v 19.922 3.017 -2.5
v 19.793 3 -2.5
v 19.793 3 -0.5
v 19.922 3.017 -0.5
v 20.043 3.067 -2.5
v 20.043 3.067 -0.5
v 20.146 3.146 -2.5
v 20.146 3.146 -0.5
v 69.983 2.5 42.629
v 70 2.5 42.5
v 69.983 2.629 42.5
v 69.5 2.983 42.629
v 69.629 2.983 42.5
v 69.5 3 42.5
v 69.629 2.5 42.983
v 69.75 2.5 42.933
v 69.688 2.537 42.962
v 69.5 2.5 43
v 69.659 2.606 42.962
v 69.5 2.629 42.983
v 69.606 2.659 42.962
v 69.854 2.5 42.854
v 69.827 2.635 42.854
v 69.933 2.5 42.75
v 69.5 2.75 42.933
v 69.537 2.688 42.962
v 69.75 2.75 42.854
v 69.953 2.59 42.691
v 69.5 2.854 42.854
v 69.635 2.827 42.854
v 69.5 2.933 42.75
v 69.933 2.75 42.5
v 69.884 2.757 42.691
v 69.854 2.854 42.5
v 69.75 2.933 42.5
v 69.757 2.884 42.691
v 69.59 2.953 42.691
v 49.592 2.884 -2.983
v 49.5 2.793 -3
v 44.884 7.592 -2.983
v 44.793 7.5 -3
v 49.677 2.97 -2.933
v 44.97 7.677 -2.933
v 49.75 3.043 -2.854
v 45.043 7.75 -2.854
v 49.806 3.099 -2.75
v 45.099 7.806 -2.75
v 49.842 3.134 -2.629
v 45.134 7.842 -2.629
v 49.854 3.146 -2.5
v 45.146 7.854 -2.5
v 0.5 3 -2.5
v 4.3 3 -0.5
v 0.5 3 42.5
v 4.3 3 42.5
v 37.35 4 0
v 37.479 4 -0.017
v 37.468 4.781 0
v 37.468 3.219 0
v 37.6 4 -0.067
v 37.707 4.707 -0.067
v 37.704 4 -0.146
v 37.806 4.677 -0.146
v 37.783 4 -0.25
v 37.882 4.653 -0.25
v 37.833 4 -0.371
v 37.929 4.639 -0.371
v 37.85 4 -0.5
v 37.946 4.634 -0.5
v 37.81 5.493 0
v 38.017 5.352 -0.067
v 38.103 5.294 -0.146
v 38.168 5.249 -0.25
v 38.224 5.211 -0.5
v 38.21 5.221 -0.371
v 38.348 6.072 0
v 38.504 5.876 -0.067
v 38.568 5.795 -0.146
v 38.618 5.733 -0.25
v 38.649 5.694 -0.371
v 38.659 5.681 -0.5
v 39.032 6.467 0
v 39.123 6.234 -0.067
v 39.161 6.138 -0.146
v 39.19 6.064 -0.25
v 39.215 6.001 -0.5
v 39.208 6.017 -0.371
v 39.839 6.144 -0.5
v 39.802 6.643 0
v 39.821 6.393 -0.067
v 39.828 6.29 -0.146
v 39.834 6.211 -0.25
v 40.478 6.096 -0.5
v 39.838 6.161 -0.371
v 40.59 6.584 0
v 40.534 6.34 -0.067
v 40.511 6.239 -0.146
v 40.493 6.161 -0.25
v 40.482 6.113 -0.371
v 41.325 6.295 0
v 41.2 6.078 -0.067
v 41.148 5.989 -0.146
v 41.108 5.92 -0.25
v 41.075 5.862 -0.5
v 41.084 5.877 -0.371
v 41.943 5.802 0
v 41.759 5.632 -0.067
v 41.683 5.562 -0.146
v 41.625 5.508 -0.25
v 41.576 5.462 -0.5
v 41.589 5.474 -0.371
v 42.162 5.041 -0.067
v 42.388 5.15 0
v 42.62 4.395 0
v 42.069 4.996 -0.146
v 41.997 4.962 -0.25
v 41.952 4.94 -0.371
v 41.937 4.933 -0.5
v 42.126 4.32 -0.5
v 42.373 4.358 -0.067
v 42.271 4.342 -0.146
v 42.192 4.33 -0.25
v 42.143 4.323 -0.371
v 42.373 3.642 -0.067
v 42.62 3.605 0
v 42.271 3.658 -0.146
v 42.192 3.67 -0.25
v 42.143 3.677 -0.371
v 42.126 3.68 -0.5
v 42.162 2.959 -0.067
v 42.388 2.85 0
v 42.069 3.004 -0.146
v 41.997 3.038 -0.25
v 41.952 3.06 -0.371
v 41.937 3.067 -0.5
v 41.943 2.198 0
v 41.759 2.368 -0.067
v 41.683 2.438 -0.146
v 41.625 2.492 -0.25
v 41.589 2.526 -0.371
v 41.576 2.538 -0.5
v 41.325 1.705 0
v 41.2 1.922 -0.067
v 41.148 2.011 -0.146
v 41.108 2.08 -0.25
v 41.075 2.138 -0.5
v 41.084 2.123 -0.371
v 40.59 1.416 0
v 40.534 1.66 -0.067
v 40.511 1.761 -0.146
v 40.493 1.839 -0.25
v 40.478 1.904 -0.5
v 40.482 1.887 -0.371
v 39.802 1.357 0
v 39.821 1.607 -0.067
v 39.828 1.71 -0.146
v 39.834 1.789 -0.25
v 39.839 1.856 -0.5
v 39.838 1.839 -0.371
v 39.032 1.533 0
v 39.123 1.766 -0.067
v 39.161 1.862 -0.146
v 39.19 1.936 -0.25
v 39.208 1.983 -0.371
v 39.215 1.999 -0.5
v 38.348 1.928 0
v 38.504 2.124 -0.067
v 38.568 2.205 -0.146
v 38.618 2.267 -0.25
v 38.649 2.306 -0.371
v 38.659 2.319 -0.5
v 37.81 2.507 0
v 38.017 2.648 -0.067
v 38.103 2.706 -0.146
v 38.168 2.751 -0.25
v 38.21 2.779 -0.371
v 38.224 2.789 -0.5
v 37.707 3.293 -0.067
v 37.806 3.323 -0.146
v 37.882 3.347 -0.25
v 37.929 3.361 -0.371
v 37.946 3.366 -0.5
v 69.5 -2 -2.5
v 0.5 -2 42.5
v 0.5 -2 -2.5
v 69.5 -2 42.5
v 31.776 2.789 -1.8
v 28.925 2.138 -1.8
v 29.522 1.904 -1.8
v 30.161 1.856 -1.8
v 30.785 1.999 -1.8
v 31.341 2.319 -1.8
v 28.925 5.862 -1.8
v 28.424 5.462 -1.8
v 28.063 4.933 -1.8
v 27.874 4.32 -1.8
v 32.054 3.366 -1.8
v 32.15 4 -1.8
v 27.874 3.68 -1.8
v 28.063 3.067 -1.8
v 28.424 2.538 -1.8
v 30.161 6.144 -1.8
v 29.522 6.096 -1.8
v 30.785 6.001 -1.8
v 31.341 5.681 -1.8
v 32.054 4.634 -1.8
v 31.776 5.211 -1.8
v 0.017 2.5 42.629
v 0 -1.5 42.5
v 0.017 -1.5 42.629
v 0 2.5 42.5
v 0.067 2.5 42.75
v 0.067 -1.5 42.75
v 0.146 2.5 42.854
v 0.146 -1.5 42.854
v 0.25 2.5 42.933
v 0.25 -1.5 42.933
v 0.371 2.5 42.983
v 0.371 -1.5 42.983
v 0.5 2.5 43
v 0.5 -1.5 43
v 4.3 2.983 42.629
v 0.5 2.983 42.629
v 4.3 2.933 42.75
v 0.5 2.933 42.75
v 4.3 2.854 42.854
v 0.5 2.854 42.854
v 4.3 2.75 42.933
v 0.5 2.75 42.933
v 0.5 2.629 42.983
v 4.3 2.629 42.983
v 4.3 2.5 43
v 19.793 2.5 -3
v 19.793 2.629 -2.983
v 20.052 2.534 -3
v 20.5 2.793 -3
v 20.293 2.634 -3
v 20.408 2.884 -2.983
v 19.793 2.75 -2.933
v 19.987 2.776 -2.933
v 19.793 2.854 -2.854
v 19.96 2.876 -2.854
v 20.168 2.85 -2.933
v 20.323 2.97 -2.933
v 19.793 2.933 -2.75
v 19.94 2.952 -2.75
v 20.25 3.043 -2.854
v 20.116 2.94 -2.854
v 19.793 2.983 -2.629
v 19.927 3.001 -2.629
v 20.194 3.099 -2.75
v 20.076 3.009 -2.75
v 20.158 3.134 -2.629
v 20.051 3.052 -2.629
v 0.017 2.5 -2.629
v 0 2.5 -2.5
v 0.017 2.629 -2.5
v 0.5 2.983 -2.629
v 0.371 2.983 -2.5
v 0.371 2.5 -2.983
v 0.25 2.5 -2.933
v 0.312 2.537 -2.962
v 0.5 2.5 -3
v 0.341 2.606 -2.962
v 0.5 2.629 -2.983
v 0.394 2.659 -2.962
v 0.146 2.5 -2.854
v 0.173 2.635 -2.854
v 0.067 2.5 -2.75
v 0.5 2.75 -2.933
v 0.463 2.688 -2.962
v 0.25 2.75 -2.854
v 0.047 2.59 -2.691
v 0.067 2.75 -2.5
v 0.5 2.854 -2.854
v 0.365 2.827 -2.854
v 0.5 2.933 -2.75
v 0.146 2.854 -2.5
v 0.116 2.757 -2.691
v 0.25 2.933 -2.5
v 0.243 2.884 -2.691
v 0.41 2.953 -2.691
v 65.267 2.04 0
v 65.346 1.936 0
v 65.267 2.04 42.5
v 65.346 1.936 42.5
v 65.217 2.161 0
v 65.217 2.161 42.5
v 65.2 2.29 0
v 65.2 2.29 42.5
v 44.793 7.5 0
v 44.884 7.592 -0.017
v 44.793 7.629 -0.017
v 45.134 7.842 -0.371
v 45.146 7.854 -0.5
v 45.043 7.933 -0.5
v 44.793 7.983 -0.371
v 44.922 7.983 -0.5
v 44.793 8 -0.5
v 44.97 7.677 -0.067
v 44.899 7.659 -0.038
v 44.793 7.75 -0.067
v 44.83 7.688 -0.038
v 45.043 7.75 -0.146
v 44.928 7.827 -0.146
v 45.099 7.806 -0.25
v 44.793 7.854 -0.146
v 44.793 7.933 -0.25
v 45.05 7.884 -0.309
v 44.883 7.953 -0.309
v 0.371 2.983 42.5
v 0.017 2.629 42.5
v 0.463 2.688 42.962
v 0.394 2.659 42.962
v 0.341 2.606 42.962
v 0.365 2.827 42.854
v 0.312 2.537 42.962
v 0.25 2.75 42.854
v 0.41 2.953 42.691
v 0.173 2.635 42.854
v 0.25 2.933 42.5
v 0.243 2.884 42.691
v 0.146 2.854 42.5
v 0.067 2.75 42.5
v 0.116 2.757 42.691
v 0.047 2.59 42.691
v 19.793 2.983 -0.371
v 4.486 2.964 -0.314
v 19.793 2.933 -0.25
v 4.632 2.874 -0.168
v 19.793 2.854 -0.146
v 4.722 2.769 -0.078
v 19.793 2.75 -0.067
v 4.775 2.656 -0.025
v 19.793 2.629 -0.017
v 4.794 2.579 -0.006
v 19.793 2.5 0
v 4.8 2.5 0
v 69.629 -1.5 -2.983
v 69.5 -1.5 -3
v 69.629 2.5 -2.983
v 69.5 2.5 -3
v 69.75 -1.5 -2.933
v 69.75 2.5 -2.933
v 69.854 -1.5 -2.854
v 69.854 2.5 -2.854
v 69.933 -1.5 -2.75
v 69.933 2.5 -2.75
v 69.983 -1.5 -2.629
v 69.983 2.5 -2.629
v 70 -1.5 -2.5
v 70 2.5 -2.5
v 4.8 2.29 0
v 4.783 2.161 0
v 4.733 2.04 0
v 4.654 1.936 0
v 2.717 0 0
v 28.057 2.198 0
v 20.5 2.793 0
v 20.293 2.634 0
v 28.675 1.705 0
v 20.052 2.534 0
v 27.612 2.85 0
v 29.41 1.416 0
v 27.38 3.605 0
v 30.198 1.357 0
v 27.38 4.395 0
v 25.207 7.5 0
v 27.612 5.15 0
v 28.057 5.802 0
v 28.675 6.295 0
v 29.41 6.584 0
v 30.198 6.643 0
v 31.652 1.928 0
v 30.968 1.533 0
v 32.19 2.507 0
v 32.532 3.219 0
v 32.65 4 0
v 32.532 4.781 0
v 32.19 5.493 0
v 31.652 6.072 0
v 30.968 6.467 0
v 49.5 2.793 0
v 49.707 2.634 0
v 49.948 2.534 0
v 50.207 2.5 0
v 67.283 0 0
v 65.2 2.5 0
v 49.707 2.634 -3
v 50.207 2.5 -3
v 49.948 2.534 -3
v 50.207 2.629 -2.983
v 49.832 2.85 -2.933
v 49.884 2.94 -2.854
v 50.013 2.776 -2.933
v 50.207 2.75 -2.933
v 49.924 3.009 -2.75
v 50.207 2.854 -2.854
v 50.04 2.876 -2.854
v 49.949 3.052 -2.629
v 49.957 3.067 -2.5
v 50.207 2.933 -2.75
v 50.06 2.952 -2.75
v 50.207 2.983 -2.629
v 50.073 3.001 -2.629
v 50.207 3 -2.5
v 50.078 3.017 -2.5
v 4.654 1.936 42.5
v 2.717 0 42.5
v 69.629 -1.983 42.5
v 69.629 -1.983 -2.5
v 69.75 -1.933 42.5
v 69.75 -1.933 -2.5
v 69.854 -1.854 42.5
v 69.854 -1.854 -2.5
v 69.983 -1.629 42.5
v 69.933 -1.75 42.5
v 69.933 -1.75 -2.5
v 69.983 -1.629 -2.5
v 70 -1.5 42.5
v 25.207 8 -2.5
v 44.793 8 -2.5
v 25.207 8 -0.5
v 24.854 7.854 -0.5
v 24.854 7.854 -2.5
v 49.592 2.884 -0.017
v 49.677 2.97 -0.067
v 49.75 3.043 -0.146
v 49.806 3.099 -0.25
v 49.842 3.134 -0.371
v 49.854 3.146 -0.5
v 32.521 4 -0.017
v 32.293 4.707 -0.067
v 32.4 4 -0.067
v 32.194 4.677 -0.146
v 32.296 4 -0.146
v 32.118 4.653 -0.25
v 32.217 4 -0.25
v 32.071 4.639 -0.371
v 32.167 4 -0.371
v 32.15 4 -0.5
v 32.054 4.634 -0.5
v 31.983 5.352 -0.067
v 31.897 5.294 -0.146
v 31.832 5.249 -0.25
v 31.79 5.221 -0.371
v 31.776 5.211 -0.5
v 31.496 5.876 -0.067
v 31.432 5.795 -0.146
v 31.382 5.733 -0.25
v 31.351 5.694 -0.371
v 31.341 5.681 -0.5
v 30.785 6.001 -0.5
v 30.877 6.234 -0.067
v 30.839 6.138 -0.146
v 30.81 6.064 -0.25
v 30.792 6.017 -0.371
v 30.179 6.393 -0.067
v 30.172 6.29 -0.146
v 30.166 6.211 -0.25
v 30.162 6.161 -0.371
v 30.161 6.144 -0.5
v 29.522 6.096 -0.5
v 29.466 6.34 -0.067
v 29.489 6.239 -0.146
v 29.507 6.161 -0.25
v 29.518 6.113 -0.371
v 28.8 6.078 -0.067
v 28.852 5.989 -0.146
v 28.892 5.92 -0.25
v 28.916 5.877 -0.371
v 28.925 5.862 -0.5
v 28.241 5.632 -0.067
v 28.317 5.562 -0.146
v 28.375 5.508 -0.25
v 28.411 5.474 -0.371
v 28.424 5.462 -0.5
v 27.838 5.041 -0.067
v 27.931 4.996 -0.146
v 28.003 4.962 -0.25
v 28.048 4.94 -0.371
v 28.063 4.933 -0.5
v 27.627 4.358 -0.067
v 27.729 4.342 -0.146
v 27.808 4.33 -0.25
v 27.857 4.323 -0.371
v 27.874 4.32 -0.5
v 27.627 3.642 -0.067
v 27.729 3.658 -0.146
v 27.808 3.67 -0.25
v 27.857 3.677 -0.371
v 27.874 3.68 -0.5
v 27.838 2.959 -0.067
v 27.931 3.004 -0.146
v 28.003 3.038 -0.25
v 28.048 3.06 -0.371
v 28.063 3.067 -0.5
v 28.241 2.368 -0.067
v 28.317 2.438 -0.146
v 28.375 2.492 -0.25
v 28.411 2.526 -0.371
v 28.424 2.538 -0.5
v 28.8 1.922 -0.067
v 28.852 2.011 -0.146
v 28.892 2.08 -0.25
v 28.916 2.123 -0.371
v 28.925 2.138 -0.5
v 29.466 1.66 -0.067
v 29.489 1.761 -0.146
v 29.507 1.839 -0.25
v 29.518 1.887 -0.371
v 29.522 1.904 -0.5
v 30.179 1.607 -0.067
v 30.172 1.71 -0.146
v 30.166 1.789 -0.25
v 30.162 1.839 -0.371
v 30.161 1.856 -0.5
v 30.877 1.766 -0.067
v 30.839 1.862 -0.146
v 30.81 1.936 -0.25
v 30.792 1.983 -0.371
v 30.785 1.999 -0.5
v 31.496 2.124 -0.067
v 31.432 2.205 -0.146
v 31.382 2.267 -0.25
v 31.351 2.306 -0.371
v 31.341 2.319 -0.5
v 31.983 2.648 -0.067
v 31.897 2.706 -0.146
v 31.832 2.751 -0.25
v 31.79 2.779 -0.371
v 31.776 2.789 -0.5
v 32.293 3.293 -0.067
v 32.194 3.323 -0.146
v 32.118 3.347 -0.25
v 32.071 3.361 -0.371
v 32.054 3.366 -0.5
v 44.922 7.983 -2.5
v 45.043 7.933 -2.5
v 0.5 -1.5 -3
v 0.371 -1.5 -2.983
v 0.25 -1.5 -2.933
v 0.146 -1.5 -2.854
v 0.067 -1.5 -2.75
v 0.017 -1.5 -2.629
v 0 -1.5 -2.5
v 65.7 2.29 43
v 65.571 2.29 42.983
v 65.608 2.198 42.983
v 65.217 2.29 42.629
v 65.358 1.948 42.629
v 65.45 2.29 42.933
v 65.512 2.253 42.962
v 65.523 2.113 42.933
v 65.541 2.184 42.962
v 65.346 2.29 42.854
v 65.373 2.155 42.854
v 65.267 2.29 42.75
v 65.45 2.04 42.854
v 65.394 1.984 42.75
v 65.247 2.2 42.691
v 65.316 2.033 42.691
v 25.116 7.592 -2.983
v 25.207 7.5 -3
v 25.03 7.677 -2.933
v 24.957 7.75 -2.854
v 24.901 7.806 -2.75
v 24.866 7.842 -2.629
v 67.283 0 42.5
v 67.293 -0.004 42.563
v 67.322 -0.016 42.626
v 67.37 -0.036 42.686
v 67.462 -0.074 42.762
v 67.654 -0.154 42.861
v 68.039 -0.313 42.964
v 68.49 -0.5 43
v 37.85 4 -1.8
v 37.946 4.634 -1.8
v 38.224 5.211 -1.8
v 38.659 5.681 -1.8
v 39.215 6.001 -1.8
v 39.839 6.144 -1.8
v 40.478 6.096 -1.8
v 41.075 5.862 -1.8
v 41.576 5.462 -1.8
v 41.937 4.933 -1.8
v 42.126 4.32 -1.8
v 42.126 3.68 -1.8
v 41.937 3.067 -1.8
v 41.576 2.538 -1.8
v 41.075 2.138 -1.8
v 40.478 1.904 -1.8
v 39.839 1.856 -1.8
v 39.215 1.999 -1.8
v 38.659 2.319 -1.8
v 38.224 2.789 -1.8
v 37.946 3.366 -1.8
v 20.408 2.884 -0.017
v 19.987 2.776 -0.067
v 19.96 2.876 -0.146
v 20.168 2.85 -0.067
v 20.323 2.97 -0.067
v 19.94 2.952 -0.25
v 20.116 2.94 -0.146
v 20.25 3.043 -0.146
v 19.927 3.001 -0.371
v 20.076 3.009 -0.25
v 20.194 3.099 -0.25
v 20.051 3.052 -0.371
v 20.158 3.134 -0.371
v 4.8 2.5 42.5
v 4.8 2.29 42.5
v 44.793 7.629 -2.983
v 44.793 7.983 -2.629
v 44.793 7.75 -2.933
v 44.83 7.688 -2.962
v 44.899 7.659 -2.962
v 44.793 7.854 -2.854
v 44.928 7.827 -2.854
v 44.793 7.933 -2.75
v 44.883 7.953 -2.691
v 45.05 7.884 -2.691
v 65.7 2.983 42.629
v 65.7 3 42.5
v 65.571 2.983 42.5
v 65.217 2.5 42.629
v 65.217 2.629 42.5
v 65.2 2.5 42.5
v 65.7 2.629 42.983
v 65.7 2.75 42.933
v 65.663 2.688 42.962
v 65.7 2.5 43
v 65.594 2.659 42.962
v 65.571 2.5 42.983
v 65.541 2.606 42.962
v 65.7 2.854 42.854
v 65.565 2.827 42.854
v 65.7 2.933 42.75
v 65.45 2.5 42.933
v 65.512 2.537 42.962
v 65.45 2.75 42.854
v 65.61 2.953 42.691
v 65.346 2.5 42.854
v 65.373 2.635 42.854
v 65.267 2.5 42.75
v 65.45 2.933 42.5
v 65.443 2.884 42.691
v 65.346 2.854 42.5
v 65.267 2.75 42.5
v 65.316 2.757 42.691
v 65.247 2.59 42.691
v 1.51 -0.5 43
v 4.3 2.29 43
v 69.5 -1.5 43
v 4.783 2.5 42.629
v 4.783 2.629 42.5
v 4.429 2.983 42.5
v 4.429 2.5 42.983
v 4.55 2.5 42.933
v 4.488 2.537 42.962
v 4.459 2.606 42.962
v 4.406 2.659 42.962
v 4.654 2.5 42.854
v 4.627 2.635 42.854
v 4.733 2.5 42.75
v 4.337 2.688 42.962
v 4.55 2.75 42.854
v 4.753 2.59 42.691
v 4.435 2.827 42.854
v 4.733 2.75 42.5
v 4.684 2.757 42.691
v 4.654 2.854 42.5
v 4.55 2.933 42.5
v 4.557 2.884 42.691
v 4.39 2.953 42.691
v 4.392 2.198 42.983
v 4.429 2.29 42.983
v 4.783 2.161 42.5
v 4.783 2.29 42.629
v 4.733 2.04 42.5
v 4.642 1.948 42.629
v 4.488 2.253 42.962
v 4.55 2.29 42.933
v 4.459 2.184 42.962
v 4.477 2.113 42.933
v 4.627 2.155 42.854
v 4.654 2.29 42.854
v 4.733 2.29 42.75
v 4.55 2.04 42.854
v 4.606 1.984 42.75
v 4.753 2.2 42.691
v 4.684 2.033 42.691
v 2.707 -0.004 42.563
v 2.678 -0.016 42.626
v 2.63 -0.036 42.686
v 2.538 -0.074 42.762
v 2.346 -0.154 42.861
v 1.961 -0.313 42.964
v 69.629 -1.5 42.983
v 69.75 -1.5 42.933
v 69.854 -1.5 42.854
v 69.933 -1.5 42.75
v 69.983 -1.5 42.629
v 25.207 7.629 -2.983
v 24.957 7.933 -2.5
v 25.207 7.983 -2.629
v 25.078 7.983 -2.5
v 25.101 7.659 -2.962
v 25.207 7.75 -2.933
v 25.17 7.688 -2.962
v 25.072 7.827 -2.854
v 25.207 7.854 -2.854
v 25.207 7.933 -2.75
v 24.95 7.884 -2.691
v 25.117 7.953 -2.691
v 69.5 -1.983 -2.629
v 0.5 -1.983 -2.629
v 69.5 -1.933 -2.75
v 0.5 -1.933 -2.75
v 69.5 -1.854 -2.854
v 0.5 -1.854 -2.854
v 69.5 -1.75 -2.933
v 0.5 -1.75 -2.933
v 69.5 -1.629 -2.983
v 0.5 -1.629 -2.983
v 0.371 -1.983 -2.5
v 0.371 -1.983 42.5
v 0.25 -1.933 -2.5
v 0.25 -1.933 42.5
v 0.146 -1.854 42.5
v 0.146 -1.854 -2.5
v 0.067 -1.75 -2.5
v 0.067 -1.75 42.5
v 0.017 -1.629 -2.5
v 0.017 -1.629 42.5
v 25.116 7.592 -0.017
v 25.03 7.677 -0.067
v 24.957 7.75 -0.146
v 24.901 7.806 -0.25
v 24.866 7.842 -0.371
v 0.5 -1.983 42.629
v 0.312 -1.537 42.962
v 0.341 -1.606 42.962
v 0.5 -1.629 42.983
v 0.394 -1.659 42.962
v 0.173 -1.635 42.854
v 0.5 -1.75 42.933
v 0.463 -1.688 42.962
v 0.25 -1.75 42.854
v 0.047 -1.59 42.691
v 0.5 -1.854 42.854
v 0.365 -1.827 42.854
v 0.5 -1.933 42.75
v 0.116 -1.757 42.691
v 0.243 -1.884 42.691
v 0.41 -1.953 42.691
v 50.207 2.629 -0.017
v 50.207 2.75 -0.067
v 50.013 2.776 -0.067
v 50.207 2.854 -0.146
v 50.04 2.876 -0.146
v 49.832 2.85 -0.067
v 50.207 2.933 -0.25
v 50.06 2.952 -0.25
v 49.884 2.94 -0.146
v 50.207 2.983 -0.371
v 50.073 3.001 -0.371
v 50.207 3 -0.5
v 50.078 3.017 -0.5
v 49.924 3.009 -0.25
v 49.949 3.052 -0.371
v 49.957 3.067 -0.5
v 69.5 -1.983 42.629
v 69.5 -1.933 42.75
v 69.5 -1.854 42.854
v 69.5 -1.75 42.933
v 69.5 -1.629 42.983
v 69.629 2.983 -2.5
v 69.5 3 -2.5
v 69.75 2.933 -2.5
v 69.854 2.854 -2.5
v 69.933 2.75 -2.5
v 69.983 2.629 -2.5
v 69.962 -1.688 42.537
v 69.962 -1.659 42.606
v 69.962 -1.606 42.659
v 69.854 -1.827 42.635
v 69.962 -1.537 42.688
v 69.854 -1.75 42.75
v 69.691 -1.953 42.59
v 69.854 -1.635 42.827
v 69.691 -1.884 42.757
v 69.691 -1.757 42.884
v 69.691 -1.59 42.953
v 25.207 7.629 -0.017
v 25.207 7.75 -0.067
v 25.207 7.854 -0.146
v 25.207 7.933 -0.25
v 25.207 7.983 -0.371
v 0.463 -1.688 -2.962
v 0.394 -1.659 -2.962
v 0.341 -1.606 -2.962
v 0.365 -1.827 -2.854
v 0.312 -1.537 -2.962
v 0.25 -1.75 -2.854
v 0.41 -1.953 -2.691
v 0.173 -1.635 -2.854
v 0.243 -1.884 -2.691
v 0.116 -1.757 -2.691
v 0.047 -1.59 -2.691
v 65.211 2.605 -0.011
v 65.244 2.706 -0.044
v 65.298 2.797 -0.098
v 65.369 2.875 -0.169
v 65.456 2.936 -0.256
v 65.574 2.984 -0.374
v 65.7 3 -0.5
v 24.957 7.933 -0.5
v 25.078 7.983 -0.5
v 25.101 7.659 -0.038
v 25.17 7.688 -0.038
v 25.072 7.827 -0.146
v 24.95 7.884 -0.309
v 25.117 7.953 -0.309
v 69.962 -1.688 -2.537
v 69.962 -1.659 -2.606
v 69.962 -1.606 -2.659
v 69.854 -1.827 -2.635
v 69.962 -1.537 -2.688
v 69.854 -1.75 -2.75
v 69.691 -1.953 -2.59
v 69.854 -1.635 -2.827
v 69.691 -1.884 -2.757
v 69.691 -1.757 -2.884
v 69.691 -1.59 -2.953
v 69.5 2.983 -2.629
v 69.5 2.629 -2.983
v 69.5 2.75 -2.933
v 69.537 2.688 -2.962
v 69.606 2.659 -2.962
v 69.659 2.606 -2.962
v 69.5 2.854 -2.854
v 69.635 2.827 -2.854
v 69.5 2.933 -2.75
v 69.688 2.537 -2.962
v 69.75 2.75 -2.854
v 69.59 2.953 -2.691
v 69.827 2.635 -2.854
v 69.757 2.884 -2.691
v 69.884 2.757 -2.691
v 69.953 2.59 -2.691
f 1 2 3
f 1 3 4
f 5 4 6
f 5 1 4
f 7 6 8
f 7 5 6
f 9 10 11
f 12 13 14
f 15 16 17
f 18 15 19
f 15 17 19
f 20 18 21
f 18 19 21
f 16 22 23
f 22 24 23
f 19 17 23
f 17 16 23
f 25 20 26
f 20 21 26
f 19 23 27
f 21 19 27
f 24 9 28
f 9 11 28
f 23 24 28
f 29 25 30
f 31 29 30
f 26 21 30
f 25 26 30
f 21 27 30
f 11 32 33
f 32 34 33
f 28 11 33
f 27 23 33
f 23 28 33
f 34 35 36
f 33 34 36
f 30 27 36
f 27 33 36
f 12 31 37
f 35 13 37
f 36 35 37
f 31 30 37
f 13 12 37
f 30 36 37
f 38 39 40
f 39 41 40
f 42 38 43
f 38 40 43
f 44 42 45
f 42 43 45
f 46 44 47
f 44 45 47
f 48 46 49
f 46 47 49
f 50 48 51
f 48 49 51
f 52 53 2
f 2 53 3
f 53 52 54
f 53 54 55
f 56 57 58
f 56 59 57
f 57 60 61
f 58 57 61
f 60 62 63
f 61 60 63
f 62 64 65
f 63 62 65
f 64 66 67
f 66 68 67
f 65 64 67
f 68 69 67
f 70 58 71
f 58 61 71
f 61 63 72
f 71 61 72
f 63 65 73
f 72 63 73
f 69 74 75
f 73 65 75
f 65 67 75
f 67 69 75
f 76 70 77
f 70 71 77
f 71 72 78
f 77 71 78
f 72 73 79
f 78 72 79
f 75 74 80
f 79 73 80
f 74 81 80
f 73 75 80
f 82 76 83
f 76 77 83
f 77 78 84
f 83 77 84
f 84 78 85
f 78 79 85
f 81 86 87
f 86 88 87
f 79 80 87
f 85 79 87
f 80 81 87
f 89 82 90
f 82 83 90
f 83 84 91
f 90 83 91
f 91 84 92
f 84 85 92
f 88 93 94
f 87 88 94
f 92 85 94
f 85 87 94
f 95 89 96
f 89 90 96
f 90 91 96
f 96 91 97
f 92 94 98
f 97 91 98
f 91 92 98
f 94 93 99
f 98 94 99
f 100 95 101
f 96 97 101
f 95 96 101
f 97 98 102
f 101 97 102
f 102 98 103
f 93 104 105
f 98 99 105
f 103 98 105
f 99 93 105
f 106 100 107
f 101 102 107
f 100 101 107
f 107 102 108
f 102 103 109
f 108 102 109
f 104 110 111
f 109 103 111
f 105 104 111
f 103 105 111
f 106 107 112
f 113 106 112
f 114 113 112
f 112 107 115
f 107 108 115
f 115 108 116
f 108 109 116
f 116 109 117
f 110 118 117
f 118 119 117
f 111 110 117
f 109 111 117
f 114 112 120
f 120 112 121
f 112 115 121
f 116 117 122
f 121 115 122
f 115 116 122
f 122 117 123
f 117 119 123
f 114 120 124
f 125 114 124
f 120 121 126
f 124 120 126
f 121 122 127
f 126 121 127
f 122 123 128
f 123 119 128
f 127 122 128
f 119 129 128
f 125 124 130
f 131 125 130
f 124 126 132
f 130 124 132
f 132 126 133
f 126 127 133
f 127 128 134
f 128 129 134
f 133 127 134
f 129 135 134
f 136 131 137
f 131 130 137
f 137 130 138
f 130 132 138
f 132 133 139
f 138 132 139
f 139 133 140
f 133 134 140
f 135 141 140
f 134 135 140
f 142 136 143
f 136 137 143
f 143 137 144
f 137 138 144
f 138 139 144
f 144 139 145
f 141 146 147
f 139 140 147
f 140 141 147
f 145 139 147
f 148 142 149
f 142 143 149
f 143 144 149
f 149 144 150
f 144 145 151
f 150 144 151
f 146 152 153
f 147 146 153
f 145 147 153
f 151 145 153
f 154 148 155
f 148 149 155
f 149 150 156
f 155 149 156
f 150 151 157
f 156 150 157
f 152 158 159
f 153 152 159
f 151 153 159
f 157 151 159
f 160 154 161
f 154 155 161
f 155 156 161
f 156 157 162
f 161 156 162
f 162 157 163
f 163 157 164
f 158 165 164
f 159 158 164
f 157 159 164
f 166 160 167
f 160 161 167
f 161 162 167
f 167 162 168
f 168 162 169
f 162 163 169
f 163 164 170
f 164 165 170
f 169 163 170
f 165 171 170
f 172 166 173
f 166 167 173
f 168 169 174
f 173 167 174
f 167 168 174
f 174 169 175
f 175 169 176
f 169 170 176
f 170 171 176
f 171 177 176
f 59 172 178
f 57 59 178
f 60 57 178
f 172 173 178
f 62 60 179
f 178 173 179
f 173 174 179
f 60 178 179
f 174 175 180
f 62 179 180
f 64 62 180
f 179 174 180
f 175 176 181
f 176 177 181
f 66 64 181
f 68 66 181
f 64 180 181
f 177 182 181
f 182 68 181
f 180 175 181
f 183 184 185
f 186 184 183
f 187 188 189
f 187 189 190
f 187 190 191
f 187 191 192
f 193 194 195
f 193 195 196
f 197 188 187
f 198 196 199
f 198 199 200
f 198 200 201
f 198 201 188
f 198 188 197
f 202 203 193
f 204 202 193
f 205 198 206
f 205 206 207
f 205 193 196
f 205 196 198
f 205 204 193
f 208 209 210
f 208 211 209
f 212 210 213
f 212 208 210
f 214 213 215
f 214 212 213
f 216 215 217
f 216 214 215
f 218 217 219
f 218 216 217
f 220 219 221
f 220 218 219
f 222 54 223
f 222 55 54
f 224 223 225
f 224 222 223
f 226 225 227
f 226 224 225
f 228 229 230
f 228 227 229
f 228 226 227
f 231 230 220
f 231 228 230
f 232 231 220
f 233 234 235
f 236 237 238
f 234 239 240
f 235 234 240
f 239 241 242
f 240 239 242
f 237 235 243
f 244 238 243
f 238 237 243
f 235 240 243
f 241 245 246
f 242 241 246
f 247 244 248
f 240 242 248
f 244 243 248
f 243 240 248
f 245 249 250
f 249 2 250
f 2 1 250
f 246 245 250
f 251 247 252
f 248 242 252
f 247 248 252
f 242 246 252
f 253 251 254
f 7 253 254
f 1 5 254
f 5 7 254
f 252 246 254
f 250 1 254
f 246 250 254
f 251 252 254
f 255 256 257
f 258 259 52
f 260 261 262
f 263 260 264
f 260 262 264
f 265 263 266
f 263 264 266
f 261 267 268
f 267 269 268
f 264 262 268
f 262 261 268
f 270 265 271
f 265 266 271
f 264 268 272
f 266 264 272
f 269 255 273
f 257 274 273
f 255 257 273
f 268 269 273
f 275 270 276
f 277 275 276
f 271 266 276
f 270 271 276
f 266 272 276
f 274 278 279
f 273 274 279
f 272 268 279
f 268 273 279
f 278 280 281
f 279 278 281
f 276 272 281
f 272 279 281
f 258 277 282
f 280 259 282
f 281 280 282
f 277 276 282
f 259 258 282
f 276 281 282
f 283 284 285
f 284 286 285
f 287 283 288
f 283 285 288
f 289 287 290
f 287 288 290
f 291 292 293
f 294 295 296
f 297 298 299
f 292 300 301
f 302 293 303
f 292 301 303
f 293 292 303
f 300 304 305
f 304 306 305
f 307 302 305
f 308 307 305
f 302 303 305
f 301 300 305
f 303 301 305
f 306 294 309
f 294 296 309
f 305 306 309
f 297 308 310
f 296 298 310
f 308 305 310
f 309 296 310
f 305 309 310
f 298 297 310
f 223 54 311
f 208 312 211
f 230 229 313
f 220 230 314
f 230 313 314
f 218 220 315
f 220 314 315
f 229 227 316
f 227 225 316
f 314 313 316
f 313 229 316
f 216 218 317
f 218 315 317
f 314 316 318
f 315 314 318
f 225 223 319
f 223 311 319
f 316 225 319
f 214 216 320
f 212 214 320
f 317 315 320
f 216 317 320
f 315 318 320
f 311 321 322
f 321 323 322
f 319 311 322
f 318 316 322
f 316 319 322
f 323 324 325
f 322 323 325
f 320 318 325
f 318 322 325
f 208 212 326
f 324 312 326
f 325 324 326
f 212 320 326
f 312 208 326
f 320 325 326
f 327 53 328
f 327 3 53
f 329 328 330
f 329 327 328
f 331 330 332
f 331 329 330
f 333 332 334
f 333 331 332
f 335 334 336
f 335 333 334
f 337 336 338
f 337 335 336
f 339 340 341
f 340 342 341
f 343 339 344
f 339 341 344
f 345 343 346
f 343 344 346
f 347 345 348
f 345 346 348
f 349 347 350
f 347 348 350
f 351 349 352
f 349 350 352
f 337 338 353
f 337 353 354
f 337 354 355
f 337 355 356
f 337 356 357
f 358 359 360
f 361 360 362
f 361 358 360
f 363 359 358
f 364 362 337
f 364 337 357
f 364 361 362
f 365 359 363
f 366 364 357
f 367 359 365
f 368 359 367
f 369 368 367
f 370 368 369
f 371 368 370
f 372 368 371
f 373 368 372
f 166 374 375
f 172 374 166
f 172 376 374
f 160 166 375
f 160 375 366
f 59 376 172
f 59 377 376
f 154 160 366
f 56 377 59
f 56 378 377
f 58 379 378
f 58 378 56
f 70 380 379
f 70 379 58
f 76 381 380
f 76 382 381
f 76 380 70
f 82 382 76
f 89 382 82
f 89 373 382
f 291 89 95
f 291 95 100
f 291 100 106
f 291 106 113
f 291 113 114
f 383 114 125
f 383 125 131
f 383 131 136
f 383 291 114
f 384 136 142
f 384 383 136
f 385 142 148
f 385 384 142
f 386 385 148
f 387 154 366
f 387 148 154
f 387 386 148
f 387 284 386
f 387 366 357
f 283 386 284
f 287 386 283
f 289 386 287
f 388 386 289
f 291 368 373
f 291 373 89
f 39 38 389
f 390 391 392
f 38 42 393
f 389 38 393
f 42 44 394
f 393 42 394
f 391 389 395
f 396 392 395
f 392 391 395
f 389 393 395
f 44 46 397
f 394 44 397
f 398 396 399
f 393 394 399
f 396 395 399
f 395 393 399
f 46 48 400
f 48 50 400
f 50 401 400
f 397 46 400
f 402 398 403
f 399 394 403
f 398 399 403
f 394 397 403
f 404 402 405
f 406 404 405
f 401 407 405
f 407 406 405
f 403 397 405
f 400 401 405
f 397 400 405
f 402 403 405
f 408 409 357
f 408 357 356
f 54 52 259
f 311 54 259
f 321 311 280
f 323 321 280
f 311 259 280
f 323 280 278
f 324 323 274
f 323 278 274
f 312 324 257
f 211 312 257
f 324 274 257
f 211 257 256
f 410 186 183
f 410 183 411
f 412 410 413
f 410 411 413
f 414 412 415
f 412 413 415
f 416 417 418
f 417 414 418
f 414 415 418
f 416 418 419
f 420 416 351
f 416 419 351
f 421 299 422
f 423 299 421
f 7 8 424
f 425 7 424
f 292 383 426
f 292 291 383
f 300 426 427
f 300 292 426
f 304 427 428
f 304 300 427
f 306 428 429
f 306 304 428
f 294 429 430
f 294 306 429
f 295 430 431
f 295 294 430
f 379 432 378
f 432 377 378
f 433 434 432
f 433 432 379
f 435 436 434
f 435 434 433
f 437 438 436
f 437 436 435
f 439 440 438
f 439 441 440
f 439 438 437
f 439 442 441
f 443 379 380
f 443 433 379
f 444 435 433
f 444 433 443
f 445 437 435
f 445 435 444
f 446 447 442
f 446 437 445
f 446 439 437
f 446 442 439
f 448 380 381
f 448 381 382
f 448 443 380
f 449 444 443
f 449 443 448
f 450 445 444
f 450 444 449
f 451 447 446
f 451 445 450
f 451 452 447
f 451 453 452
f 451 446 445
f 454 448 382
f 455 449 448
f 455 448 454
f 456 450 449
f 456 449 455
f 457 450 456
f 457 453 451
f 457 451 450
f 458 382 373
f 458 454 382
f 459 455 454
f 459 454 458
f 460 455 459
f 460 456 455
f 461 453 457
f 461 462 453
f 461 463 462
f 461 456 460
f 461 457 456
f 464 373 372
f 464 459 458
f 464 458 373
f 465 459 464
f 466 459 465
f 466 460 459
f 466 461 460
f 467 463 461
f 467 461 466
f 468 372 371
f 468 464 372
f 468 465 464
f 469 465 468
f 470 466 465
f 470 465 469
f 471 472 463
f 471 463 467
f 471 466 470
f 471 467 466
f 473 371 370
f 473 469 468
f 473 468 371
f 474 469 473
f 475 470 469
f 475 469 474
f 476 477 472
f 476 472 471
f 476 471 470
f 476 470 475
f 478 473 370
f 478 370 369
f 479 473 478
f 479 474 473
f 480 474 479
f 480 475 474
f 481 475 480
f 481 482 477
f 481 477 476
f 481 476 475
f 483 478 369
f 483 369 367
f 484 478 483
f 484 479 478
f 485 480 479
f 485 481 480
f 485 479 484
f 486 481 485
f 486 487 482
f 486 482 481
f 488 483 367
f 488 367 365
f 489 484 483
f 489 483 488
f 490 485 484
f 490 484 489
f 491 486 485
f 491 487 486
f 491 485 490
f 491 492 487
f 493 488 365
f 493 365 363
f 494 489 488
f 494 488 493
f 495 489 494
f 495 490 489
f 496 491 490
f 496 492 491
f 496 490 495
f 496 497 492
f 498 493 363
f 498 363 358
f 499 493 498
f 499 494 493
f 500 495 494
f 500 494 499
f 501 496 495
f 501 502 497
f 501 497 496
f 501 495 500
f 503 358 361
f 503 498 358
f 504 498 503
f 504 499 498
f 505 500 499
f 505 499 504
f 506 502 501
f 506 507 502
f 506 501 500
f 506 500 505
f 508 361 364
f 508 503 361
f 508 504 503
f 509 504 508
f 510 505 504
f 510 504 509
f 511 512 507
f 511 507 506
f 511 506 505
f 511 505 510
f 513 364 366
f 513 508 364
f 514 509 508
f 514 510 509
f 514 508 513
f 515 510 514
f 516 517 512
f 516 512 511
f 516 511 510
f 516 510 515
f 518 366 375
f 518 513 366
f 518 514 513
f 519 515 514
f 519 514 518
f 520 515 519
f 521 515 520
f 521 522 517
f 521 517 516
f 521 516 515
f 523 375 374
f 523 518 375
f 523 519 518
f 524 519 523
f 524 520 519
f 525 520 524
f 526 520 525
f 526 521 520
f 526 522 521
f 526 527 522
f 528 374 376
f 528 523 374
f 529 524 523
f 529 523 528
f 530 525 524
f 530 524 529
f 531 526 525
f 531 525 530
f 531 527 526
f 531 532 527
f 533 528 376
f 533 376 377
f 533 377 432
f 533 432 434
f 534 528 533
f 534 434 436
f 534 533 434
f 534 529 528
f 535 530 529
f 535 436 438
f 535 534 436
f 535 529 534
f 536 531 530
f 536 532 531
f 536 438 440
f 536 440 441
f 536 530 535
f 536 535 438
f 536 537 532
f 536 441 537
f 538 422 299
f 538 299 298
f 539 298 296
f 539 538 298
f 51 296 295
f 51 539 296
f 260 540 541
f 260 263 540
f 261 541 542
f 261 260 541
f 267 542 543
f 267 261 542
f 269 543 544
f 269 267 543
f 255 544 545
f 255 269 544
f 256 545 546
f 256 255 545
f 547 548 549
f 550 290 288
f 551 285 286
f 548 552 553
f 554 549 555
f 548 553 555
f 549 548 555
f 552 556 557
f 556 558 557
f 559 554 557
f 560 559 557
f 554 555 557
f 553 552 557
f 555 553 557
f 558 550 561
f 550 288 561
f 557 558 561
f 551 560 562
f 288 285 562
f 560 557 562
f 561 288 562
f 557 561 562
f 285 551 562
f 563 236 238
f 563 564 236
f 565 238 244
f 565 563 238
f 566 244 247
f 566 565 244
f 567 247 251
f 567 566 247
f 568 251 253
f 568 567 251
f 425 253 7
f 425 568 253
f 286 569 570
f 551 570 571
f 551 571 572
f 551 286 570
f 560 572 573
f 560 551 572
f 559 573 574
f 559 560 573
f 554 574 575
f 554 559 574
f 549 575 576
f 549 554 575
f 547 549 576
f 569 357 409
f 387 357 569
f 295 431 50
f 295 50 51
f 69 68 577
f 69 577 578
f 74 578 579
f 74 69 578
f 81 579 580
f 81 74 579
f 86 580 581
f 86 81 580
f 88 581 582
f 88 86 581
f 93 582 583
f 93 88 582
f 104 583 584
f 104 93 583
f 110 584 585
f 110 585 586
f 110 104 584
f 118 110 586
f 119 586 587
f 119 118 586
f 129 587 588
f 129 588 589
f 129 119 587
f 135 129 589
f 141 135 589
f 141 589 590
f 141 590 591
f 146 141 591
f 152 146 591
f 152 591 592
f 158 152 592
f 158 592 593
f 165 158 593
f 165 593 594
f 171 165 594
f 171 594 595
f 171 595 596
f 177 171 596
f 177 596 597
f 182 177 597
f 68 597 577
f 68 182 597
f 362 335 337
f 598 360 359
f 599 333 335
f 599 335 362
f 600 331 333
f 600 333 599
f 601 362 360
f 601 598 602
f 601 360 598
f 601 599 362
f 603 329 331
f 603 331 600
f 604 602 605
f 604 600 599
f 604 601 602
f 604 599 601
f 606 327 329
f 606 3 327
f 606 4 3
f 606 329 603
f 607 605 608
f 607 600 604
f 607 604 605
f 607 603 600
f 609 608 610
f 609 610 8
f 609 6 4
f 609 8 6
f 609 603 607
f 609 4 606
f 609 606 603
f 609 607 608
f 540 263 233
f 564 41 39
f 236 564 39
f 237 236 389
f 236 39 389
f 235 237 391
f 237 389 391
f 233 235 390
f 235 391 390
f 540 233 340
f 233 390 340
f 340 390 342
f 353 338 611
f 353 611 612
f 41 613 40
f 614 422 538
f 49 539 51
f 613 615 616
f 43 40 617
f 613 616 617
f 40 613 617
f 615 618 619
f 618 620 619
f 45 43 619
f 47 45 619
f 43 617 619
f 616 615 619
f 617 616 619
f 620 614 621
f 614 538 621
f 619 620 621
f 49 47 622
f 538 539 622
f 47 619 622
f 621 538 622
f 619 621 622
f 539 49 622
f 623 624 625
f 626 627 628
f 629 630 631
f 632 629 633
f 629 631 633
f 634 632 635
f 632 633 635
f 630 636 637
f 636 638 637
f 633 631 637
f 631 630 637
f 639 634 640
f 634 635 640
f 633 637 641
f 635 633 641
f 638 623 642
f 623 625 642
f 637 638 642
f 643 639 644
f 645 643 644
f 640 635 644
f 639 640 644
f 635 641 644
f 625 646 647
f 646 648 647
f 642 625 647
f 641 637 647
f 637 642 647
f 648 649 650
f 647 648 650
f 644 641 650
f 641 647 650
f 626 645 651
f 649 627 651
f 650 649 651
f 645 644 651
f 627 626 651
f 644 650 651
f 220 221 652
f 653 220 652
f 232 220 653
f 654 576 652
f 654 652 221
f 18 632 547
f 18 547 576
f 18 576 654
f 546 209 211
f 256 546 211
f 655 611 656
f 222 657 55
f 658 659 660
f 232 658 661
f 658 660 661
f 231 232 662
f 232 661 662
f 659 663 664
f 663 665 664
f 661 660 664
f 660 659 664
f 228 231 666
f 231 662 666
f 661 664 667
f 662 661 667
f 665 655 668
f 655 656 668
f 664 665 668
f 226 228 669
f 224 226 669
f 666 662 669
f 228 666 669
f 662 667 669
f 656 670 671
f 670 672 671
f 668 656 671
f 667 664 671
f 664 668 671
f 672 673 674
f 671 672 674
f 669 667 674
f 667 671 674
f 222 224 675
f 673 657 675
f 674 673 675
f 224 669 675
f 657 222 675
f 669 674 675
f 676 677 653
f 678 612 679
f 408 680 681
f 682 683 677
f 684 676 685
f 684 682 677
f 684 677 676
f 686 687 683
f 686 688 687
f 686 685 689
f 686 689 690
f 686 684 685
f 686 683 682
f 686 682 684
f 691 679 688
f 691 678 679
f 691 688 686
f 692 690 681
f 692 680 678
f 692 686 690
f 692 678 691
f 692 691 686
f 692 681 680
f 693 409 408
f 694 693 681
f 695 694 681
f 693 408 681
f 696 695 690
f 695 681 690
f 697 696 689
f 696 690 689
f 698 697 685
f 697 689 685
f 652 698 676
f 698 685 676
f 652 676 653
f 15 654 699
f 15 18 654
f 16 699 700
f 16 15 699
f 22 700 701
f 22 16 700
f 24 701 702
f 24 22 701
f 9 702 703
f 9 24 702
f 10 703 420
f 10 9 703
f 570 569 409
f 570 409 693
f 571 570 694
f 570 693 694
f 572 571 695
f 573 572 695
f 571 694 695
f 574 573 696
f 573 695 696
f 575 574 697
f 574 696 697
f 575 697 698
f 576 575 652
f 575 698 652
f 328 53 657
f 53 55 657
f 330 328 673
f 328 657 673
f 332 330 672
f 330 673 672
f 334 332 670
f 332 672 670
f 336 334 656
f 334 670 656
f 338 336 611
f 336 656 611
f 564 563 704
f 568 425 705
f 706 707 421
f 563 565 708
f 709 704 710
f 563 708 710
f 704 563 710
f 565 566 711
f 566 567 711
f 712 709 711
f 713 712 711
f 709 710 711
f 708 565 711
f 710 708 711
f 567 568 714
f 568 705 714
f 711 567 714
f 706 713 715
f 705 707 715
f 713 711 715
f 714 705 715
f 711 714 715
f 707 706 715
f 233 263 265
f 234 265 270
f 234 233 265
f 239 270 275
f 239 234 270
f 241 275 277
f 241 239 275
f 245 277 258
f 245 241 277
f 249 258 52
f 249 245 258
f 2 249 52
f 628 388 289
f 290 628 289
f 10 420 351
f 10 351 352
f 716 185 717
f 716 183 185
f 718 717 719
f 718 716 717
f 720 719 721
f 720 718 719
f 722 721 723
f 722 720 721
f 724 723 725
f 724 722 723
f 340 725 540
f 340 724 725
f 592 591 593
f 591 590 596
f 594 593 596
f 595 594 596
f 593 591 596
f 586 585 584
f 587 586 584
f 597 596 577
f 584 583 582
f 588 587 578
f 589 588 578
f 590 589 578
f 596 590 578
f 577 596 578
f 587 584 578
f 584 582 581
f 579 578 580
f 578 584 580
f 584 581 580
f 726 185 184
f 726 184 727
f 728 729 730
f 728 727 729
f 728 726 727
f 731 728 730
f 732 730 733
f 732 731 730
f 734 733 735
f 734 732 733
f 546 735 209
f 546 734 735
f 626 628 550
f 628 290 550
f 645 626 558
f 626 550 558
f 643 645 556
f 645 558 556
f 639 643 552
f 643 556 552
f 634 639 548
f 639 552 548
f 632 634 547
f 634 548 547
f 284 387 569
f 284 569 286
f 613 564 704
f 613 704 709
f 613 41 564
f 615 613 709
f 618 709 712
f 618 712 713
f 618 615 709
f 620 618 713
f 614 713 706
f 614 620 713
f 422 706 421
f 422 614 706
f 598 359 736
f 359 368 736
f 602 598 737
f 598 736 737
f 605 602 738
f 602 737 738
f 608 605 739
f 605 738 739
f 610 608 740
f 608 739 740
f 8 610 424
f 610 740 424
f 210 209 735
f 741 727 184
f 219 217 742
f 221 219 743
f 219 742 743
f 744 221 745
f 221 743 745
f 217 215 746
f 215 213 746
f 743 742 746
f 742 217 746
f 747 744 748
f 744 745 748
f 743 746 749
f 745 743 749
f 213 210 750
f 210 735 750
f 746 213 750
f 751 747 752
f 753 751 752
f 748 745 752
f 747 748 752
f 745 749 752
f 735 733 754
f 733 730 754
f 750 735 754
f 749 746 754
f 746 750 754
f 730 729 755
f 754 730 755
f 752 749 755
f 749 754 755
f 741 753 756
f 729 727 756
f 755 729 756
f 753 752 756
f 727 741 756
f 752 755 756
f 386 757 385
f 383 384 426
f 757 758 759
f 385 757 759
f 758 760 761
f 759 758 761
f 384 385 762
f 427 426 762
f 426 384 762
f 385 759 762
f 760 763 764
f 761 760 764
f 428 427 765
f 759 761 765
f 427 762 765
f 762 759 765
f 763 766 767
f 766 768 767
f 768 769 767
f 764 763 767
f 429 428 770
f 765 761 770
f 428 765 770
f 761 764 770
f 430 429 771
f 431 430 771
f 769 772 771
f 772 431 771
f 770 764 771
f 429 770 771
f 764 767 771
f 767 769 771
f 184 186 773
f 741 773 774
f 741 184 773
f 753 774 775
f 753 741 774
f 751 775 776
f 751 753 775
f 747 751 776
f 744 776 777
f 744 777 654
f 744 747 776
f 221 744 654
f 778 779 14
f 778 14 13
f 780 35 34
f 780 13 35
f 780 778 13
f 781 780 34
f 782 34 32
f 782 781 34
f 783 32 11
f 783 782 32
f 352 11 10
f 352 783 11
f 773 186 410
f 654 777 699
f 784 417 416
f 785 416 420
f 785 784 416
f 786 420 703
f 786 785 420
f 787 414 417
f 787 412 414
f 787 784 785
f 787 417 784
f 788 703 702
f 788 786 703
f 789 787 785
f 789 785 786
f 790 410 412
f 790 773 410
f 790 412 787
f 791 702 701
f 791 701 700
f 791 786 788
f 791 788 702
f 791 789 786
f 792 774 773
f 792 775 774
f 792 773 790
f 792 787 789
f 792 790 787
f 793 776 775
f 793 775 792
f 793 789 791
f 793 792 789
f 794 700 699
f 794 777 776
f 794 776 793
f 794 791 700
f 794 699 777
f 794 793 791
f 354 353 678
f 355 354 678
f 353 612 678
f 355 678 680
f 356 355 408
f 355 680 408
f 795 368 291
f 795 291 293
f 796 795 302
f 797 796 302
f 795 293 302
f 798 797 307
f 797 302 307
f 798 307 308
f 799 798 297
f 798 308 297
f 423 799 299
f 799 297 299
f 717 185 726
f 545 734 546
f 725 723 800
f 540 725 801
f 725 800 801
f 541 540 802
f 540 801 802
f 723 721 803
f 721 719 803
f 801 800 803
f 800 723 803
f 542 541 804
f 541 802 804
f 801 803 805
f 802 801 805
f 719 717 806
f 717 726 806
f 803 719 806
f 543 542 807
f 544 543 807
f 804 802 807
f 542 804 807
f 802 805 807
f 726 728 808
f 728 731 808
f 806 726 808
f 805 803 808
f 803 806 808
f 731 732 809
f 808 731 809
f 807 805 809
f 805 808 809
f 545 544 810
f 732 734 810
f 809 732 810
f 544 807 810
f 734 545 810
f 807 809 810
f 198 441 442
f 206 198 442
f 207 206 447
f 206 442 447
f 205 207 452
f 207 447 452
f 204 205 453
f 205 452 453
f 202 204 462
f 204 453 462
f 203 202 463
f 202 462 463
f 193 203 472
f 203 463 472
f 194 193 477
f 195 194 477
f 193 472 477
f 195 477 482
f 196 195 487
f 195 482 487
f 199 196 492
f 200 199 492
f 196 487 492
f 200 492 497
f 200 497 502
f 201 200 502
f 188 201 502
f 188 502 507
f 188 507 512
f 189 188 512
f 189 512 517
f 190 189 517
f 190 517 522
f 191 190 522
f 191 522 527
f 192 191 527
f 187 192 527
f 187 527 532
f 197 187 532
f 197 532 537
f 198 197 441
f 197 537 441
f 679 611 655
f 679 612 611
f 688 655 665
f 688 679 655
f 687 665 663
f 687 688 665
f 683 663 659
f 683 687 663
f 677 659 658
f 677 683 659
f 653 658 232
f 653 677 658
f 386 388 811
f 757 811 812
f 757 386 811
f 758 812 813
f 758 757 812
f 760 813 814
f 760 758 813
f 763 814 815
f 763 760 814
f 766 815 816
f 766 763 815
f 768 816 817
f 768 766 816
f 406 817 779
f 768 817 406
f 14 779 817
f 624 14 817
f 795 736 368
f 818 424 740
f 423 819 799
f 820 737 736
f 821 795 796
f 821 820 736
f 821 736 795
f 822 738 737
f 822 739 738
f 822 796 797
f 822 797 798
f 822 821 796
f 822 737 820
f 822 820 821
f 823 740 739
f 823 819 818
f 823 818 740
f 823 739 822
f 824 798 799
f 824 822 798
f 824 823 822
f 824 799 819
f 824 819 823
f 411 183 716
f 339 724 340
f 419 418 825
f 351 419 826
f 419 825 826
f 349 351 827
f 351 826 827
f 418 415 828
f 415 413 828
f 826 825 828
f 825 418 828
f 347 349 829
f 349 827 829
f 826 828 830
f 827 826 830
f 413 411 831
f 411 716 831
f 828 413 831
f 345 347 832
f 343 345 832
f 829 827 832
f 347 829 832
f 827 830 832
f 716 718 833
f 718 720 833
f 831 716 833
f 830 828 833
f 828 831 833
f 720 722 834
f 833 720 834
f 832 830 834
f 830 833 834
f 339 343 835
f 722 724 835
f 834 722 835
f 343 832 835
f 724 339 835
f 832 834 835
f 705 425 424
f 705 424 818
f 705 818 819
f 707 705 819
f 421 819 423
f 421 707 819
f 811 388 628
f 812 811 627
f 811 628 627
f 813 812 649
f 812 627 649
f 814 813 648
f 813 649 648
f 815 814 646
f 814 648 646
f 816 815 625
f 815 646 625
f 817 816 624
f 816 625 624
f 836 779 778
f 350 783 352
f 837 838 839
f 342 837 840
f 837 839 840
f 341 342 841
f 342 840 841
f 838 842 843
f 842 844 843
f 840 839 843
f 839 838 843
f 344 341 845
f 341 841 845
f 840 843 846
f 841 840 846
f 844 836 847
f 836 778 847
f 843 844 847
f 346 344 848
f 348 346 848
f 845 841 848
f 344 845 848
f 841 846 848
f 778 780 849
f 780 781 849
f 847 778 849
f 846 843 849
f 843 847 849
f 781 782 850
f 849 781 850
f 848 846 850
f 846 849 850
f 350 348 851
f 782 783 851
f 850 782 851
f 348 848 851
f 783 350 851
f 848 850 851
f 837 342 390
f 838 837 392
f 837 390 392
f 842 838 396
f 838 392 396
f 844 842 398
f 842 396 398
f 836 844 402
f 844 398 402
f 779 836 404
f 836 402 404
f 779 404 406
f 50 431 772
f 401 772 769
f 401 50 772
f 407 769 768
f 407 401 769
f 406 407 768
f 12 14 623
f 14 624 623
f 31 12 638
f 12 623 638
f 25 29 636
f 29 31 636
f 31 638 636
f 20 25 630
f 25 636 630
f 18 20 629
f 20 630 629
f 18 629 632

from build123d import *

# Parameters (mm, degrees)
BOSS_EXTRUDE1_DEPTH = 43
BOSS_EXTRUDE2_DEPTH = 3
SKETCH1_5_R         = 2.15
CUT_EXTRUDE1_DEPTH  = 1.8
FILLET1_R           = 0.5


with BuildPart() as part:
    # Sketch1 → Boss-Extrude1 (new body)
    with BuildSketch(Plane.XY):
        Polygon((4.8, 3), (0, 3), (0, -2), (35, -2), (35, 0), (3, 0), (2.717157288, 0), (2.858578644, 0.141421356), (4.8, 2.082842712), align=None)
    extrude(amount=BOSS_EXTRUDE1_DEPTH)

    # Sketch1<3> → Boss-Extrude2 (add)
    with BuildSketch(Plane.XY):
        Polygon((0, 3), (0, -2), (35, -2), (35, 8), (25, 8), (20, 3), align=None)
    extrude(amount=-BOSS_EXTRUDE2_DEPTH)

    # Sketch1<5> → Cut-Extrude1 (cut)
    with BuildSketch(Plane.XY):
        with Locations((30, 4)):
            Circle(SKETCH1_5_R)
    extrude(amount=-CUT_EXTRUDE1_DEPTH, mode=Mode.SUBTRACT)

    # Mirror1: part across plane


with BuildPart() as part_1:
    add(part.part)
    add(part.part.mirror(Plane(origin=(35, 0, 43), x_dir=(0, 0, 1), z_dir=(-1, 0, 0))))

    # Fillet1
    fillet1_edges = [part_1.edges().sort_by_distance(p)[0] for p in [
        (47.5, 5.5, 0),
        (22.5, 5.5, 0),
        (66.241421356, 1.041421356, 43),
        (65.2, 2.541421356, 43),
        (4.8, 2.541421356, 43),
        (3.758578644, 1.041421356, 43),
        (35, 0, 43),
        (0, 0.5, 43),
        (70, 0.5, 43),
        (35, -2, 43),
        (70, -2, 20),
        (0, -2, 20),
        (22.5, 5.5, -3),
        (0, 0.5, -3),
        (35, -2, -3),
        (70, 0.5, -3),
        (47.5, 5.5, -3),
        (25, 8, -1.5),
        (35, 8, -3),
        (45, 8, -1.5),
        (35, 8, 0),
        (57.6, 3, 0),
        (50, 3, -1.5),
        (60, 3, -3),
        (70, 3, 20),
        (67.6, 3, 43),
        (65.2, 3, 21.5),
        (2.4, 3, 43),
        (0, 3, 20),
        (10, 3, -3),
        (20, 3, -1.5),
        (12.4, 3, 0),
        (4.8, 3, 21.5),
        (4.8, 2.082842712, 21.5),
        (65.2, 2.082842712, 21.5),
        (27.85, 4, 0),
        (42.15, 4, 0),
    ]]
    fillet(fillet1_edges, radius=FILLET1_R)


solid = part_1.part
